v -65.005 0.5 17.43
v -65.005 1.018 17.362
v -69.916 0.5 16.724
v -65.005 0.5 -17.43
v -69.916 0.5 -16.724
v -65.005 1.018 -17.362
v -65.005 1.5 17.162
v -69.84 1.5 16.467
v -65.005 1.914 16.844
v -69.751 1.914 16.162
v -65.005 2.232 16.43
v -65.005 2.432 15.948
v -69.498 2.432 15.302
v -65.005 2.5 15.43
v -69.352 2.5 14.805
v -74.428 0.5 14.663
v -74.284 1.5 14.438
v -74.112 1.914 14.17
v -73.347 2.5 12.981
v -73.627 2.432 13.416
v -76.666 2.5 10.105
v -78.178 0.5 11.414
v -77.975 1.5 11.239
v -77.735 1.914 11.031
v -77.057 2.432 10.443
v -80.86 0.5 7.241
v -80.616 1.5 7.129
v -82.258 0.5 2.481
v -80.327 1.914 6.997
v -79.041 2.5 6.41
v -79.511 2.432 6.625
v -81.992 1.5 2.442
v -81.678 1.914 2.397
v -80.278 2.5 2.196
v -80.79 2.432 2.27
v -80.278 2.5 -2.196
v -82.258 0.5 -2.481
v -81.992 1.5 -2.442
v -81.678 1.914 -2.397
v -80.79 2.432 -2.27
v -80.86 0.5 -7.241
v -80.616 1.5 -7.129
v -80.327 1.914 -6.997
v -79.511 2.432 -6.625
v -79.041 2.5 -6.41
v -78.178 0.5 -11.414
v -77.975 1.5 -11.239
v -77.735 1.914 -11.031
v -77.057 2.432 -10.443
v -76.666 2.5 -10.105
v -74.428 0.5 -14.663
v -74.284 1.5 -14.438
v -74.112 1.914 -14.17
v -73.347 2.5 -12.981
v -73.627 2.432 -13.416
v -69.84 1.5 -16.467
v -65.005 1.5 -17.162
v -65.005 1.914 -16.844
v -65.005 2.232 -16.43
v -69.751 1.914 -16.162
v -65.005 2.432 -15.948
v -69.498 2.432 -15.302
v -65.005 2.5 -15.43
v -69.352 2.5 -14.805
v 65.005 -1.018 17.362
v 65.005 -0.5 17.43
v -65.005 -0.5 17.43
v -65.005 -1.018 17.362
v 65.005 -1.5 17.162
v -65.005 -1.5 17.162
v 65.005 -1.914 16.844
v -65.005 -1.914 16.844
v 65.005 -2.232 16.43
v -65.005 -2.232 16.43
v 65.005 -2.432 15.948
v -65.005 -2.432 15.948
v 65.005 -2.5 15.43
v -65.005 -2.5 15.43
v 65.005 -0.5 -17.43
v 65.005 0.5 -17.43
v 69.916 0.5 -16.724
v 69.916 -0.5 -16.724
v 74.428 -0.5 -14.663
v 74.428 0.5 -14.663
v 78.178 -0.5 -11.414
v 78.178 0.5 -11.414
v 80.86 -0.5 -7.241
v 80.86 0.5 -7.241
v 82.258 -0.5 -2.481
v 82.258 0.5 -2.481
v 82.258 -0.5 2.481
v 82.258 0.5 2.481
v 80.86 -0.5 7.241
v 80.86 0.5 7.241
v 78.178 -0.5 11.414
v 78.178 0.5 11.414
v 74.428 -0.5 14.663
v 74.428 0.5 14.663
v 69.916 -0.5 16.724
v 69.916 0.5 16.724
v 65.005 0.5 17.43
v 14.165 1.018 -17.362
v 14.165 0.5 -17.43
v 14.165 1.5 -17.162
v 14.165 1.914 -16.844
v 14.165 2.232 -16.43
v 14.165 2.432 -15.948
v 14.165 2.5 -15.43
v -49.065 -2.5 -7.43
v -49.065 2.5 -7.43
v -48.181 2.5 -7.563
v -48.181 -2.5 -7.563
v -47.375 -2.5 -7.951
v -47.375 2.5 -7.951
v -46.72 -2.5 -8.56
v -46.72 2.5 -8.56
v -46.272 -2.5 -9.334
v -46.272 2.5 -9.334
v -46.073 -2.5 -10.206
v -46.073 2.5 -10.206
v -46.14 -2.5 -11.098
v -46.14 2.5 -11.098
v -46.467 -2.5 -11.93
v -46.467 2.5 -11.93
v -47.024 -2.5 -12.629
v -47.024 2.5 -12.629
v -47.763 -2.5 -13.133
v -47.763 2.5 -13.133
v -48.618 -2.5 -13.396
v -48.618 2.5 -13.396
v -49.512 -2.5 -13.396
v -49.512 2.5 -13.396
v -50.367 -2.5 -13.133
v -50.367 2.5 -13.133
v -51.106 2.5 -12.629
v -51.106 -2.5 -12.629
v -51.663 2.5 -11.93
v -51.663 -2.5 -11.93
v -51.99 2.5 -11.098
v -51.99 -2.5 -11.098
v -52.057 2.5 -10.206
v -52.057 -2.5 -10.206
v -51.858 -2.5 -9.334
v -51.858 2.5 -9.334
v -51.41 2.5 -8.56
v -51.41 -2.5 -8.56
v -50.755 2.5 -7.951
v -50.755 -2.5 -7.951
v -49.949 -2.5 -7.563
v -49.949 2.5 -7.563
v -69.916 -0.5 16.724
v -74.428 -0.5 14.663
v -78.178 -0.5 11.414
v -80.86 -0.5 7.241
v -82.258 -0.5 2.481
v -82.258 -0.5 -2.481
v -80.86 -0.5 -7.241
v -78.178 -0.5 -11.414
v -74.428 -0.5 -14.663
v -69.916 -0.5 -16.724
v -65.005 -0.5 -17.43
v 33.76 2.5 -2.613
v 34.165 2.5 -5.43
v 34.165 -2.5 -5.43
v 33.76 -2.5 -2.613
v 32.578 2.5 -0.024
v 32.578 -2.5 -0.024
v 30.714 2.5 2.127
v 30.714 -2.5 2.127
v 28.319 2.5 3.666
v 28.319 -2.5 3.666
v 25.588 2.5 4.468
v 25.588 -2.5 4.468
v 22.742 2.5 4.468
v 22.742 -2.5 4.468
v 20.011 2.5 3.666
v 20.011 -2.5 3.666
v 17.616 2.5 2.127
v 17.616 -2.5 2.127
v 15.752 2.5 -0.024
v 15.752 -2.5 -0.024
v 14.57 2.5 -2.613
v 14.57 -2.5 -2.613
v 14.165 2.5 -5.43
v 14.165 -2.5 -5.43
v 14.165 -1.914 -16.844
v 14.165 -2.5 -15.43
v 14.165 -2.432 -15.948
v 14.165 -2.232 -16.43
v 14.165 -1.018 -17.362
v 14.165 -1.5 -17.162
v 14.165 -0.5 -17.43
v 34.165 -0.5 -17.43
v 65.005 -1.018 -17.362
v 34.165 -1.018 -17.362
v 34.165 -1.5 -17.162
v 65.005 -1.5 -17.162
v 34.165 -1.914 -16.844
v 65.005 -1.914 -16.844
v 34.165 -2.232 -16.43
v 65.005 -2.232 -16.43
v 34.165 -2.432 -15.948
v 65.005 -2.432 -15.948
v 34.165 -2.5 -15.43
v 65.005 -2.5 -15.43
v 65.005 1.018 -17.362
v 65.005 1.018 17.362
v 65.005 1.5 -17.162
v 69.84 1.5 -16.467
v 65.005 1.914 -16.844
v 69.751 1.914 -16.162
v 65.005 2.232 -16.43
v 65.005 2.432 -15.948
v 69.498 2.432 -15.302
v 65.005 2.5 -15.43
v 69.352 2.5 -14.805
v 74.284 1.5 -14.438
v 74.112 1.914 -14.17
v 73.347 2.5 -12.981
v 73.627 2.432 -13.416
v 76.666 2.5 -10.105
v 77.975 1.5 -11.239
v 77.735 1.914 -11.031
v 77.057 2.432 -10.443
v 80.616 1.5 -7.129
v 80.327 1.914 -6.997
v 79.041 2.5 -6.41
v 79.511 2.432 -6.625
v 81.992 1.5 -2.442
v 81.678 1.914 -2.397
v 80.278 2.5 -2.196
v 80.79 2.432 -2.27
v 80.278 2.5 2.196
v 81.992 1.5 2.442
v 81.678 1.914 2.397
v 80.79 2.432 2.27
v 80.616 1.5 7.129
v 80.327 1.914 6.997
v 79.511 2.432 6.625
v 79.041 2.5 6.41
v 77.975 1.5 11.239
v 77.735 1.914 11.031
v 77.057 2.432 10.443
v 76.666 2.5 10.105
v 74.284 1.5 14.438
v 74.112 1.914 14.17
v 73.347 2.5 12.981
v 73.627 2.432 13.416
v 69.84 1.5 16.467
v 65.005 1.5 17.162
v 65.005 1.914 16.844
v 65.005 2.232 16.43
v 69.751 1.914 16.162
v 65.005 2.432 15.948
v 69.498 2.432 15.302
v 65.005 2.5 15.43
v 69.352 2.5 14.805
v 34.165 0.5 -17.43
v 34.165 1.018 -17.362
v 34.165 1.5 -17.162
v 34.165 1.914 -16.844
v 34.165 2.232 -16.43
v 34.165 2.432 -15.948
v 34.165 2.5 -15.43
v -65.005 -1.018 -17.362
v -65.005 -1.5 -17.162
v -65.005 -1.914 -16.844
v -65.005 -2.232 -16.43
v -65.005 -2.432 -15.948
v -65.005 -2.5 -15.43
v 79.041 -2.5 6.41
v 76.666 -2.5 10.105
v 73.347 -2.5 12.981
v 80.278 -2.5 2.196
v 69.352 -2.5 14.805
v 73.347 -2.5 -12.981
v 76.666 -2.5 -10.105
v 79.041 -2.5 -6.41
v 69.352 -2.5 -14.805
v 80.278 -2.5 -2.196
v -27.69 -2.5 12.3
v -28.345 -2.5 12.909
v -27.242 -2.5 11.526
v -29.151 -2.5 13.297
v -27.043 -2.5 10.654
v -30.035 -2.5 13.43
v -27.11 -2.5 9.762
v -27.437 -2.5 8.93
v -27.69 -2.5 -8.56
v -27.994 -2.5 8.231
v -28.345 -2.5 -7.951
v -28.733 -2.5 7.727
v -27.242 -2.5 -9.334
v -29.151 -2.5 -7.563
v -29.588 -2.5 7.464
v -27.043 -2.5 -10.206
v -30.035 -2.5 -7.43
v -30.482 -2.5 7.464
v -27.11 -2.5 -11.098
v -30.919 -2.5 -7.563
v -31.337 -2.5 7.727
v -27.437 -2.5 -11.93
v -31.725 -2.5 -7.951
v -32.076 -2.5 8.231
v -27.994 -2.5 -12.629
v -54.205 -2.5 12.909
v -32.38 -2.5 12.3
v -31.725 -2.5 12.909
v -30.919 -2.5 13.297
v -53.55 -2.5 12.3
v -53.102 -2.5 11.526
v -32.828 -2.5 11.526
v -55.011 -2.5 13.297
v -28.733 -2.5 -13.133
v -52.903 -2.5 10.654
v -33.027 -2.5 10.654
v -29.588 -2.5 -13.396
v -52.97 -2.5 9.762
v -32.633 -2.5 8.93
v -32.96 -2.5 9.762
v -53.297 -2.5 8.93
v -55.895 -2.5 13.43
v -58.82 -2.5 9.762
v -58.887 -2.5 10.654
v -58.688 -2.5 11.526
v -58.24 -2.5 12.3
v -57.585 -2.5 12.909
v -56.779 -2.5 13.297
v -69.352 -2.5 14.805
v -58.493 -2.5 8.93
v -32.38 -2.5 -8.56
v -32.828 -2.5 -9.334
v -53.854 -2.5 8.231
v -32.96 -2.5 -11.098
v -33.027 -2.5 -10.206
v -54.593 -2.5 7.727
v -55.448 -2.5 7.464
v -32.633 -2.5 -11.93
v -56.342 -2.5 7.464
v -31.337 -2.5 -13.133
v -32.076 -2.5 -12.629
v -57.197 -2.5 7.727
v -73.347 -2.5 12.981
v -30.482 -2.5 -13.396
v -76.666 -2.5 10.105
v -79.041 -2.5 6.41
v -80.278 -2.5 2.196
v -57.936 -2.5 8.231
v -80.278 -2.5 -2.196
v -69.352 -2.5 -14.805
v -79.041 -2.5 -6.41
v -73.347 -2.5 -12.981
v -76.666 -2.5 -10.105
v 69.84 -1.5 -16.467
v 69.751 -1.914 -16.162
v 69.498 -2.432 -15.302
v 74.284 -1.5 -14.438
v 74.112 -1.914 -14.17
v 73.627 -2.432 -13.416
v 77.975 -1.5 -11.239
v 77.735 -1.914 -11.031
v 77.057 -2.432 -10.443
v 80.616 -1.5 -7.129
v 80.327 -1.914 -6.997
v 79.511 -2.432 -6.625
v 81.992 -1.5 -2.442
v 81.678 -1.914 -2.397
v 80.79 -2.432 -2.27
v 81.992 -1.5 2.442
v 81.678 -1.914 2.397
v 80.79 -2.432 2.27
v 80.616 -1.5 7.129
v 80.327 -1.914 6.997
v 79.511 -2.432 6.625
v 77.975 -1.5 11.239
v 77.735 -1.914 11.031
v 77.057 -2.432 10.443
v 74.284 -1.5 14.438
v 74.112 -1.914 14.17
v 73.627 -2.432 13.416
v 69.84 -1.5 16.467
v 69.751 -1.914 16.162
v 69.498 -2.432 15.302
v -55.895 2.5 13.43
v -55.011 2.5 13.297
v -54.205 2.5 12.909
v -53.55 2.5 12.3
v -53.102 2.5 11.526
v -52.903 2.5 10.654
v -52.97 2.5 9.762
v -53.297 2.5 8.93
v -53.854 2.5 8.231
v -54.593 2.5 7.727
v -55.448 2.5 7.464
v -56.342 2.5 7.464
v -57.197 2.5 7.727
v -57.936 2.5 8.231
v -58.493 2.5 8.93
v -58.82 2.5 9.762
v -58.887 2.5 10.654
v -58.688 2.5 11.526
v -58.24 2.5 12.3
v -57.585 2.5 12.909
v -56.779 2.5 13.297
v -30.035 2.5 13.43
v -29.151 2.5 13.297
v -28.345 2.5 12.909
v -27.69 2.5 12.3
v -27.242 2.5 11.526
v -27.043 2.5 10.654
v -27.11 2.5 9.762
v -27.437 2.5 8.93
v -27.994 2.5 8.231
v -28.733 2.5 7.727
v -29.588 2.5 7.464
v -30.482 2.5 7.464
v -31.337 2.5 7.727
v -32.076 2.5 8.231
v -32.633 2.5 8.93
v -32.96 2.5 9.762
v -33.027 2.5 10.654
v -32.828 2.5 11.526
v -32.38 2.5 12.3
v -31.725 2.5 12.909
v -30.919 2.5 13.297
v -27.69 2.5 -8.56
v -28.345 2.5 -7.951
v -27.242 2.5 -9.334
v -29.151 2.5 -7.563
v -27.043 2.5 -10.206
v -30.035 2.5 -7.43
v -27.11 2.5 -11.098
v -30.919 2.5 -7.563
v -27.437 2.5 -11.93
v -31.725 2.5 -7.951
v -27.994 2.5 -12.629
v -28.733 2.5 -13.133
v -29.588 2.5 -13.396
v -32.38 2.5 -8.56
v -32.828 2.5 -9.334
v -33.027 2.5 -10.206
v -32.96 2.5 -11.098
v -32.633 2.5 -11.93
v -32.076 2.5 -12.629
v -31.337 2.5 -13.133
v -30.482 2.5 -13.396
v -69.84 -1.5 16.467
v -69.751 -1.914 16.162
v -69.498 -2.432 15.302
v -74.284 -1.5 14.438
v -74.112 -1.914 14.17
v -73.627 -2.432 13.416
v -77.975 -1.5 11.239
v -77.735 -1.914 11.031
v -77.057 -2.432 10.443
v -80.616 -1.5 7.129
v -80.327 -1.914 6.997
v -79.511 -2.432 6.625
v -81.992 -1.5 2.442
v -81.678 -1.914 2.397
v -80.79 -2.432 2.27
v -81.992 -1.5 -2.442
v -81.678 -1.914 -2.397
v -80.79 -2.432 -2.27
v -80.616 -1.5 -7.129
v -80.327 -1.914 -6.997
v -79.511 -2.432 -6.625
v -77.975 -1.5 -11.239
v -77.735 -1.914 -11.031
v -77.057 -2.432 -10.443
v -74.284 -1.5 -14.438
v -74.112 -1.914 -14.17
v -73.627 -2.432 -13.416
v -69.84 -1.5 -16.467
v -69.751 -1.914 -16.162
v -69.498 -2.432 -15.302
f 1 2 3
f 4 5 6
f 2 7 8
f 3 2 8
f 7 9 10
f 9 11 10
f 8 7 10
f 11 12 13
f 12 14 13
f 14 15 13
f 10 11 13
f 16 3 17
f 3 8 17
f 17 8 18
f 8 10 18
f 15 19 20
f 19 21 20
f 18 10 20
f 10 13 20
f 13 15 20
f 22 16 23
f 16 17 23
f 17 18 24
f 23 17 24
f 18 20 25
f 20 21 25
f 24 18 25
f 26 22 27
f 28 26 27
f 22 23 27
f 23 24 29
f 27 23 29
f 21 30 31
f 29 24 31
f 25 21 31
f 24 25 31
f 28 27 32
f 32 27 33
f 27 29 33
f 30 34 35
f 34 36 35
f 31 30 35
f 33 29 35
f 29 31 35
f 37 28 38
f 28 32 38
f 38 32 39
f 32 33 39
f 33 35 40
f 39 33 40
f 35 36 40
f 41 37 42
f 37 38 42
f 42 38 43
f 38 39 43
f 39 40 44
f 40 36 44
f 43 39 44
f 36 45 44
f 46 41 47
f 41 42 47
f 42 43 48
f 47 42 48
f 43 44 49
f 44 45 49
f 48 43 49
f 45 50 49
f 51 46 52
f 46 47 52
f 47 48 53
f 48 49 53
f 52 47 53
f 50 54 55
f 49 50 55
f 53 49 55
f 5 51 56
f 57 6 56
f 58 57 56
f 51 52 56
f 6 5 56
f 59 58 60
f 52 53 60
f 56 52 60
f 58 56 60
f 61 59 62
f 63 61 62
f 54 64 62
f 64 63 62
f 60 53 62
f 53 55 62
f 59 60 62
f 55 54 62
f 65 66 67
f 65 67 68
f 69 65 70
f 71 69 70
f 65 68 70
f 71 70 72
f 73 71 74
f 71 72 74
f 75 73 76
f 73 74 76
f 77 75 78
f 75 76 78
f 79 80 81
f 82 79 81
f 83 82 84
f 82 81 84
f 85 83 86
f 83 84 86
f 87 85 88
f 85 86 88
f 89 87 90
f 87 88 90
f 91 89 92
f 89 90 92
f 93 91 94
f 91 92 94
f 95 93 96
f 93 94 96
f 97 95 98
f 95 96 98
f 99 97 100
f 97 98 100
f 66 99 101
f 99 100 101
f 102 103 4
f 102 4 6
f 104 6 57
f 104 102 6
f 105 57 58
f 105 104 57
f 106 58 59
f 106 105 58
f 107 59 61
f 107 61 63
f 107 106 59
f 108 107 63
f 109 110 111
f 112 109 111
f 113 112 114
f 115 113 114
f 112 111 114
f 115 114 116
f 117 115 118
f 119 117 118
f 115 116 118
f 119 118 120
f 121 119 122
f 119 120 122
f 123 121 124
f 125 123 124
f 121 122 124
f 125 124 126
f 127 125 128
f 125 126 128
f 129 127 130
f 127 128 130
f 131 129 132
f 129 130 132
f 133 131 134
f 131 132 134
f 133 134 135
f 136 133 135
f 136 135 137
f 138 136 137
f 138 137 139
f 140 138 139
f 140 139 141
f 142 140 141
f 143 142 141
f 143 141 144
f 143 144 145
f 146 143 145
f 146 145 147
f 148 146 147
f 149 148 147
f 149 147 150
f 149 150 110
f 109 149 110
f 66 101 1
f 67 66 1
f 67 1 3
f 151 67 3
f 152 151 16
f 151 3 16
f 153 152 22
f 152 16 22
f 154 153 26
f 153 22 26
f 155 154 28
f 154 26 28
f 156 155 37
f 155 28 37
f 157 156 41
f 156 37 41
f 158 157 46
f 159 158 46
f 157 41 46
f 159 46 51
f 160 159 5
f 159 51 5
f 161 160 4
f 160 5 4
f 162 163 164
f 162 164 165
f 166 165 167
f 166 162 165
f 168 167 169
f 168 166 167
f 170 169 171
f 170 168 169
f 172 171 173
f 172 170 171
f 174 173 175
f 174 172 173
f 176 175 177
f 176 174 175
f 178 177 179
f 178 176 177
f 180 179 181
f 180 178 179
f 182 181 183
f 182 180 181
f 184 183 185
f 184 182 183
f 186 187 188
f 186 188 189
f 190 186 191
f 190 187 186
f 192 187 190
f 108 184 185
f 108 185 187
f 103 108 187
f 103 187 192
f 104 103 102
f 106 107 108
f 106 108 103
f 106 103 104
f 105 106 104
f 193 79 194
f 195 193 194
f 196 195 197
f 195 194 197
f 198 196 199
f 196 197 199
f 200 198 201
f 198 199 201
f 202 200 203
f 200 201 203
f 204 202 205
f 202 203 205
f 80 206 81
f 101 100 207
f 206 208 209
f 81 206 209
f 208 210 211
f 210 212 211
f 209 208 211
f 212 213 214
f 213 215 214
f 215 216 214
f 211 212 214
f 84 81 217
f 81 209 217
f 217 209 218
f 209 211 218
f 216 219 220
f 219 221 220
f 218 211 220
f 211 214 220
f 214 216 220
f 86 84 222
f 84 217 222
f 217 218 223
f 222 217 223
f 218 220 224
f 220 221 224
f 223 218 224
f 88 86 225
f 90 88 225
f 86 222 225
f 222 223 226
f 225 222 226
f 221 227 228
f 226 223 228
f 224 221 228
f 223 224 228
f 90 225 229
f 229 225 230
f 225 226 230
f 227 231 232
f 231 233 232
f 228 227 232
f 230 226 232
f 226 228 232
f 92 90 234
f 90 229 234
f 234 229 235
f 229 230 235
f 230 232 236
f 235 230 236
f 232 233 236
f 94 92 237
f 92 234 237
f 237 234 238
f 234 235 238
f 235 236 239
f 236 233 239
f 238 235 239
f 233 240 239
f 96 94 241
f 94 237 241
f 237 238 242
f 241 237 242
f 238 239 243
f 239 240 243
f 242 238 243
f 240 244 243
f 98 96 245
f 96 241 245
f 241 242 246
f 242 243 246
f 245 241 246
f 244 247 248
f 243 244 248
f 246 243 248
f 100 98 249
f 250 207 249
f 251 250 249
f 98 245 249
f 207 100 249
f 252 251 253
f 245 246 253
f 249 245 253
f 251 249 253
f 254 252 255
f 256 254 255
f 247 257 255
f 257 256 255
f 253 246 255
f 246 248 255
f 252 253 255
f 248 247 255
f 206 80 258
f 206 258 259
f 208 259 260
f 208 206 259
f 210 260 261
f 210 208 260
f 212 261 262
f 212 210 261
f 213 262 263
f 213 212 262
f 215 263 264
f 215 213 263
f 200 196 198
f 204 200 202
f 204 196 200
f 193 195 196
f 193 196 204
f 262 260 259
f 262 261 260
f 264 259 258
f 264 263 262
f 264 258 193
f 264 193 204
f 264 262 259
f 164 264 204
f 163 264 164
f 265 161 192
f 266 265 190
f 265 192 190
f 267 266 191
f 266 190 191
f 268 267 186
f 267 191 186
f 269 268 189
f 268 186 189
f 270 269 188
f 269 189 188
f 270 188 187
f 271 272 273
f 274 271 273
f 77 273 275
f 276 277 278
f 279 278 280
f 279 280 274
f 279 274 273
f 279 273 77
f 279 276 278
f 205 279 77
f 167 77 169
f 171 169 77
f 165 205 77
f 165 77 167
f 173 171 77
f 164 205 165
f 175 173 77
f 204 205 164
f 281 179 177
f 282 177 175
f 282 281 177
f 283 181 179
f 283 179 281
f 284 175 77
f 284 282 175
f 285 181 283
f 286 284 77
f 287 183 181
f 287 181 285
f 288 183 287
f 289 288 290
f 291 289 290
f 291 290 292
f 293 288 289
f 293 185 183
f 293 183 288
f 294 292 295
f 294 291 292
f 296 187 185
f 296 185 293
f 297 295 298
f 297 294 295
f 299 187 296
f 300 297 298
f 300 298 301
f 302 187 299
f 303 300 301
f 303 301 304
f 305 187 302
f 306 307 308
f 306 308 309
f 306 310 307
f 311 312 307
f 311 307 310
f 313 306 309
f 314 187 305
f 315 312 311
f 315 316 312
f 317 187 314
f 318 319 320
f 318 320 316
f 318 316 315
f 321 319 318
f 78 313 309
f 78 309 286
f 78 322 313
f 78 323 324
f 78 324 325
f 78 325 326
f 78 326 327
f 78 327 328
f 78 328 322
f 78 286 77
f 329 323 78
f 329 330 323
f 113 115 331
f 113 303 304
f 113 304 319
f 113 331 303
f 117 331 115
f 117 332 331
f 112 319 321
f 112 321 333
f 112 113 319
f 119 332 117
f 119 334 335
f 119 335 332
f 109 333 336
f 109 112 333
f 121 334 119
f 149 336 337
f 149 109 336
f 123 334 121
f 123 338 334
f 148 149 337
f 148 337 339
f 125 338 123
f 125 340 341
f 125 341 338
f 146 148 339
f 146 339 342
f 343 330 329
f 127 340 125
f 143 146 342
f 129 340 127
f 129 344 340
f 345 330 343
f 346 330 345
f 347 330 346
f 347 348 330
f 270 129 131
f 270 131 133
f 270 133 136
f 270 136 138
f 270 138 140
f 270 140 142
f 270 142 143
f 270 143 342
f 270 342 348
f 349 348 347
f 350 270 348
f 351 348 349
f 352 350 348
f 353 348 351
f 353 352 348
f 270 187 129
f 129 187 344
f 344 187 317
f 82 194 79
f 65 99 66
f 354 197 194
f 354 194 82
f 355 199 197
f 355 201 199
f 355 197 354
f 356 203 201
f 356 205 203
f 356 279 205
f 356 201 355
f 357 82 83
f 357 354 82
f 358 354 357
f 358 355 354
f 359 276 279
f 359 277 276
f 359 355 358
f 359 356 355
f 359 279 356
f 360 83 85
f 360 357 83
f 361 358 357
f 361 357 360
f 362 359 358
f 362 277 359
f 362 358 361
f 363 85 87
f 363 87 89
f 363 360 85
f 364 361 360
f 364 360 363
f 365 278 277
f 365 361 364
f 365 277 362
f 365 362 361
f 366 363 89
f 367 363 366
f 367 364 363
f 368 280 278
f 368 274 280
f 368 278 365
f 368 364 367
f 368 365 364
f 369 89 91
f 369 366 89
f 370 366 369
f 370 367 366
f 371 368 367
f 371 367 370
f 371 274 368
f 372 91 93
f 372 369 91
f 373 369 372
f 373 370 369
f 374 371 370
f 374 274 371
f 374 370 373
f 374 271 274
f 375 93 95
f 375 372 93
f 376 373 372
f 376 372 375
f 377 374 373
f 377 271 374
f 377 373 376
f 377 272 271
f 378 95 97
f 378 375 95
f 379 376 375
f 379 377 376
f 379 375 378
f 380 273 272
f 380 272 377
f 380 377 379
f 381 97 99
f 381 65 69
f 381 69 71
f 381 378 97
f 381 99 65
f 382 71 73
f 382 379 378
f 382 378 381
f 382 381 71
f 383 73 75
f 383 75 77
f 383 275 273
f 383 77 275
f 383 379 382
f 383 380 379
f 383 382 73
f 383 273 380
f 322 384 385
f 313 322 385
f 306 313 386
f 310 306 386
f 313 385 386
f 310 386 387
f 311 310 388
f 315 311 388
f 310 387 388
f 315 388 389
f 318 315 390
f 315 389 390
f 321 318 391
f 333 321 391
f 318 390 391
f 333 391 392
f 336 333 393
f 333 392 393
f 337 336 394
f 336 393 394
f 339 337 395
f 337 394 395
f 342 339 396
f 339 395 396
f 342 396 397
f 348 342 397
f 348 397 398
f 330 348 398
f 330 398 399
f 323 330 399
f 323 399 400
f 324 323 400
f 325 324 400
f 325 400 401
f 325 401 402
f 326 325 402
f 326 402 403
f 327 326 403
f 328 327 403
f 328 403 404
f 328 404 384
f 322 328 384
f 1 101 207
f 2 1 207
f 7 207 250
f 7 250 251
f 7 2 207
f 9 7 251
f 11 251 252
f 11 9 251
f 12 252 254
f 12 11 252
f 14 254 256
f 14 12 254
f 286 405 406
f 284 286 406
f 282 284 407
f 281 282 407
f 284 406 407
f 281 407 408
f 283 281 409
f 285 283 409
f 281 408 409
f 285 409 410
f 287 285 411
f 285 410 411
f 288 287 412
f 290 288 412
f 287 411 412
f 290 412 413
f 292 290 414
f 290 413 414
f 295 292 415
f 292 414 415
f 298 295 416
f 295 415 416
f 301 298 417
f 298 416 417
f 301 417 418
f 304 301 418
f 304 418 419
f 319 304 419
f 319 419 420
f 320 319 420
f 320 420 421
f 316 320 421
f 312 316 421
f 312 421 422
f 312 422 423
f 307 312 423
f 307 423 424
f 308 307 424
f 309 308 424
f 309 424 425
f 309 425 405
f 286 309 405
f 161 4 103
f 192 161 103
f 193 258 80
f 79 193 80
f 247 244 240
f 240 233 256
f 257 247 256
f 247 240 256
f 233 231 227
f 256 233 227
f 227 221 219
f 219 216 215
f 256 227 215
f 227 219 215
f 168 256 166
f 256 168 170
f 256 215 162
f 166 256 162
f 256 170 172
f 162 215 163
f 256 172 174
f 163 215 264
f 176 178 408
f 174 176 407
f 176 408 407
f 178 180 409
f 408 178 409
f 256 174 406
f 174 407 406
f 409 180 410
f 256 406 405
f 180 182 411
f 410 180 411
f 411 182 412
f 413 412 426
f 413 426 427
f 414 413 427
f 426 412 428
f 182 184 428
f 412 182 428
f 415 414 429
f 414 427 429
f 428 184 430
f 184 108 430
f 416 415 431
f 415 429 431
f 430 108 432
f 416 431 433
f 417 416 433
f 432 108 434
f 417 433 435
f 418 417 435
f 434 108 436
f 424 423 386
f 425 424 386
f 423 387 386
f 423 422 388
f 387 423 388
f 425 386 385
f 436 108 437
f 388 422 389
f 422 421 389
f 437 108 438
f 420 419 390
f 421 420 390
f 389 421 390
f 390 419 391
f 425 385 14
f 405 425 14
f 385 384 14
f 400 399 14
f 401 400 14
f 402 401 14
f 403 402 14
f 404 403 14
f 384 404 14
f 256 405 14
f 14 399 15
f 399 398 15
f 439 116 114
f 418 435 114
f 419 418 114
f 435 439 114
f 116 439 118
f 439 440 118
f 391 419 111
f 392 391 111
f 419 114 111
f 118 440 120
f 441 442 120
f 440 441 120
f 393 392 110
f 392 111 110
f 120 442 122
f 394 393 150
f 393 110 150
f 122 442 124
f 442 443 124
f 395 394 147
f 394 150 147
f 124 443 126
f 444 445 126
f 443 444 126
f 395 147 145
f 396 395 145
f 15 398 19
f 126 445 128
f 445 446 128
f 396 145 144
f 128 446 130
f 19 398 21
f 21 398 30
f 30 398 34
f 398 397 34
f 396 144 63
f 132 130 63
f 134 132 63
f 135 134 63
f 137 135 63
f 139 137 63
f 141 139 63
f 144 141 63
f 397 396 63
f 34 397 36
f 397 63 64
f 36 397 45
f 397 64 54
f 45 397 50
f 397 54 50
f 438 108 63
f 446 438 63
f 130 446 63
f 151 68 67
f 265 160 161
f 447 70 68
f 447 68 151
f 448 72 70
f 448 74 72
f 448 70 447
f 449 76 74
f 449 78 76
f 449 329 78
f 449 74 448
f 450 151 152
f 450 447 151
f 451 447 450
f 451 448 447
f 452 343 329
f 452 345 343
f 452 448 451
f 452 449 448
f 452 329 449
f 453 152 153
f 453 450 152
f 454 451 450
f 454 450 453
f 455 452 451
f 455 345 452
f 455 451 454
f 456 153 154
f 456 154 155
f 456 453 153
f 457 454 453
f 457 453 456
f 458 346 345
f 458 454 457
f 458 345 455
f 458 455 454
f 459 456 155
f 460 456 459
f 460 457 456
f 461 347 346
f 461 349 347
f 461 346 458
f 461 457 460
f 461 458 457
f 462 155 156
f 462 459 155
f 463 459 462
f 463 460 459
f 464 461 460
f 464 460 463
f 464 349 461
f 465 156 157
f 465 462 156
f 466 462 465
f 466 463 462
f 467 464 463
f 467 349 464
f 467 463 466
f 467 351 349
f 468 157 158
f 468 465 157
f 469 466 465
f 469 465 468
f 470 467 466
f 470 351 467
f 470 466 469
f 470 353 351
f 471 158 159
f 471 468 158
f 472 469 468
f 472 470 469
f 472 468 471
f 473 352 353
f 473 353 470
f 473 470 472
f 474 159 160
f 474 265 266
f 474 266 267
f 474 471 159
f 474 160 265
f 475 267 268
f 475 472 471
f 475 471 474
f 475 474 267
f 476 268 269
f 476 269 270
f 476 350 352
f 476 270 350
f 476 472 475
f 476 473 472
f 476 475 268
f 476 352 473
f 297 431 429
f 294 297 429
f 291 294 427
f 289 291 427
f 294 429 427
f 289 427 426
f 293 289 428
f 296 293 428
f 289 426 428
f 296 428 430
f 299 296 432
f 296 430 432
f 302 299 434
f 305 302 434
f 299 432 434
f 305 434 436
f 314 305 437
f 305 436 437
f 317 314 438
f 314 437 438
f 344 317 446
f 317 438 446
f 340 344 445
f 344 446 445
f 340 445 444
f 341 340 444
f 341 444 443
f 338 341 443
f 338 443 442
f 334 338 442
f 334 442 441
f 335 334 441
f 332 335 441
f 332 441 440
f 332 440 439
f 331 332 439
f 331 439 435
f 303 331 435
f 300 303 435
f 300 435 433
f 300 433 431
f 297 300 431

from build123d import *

# Parameters (mm, degrees)
BOSS_EXTRUDE1_DEPTH = 2.5
CUT_EXTRUDE1_REACH  = 86.406
SKETCH2_R           = 3
FILLET1_R           = 2
CUT_EXTRUDE2_DEPTH  = 10


with BuildPart() as part:
    # Sketch1 → Boss-Extrude1 (new, symmetric)
    with BuildSketch(Plane(origin=(0, 0, 0), x_dir=(1, 0, 0), z_dir=(0, 1, 0))):
        with BuildLine():
            Line((-65.005, 17.43), (65.005, 17.43))
            ThreePointArc((65.005, 17.43), (82.435, 0), (65.005, -17.43))
            Line((65.005, -17.43), (-65.005, -17.43))
            ThreePointArc((-65.005, -17.43), (-82.435, 0), (-65.005, 17.43))
        make_face()
    extrude(amount=BOSS_EXTRUDE1_DEPTH, both=True)

    # Sketch2 → Cut-Extrude1 (cut, up to next)
    with BuildSketch(Plane(origin=(0, 2.5, 0), x_dir=(1, 0, 0), z_dir=(0, 1, 0)), mode=Mode.PRIVATE) as cut_extrude1_sk1:
        with Locations(Location((-49.065, 10.43, 0), (0, 0, 270))):
            Circle(SKETCH2_R)
    cut_extrude1_tool1 = extrude(cut_extrude1_sk1.sketch, amount=-CUT_EXTRUDE1_REACH, mode=Mode.PRIVATE) & part.part
    # Sketch2 → Cut-Extrude1 (cut, up to next)
    with BuildSketch(Plane(origin=(0, 2.5, 0), x_dir=(1, 0, 0), z_dir=(0, 1, 0)), mode=Mode.PRIVATE) as cut_extrude1_sk2:
        with Locations(Location((-30.035, 10.43, 0), (0, 0, 270))):
            Circle(SKETCH2_R)
    cut_extrude1_tool2 = extrude(cut_extrude1_sk2.sketch, amount=-CUT_EXTRUDE1_REACH, mode=Mode.PRIVATE) & part.part
    # Sketch2 → Cut-Extrude1 (cut, up to next)
    with BuildSketch(Plane(origin=(0, 2.5, 0), x_dir=(1, 0, 0), z_dir=(0, 1, 0)), mode=Mode.PRIVATE) as cut_extrude1_sk3:
        with Locations(Location((-55.895, -10.43, 0), (0, 0, 270))):
            Circle(SKETCH2_R)
    cut_extrude1_tool3 = extrude(cut_extrude1_sk3.sketch, amount=-CUT_EXTRUDE1_REACH, mode=Mode.PRIVATE) & part.part
    # Sketch2 → Cut-Extrude1 (cut, up to next)
    with BuildSketch(Plane(origin=(0, 2.5, 0), x_dir=(1, 0, 0), z_dir=(0, 1, 0)), mode=Mode.PRIVATE) as cut_extrude1_sk4:
        with Locations(Location((-30.035, -10.43, 0), (0, 0, 270))):
            Circle(SKETCH2_R)
    cut_extrude1_tool4 = extrude(cut_extrude1_sk4.sketch, amount=-CUT_EXTRUDE1_REACH, mode=Mode.PRIVATE) & part.part
    add(cut_extrude1_tool1.solids().sort_by_distance((-49.065, 2.5, -10.43))[0], mode=Mode.SUBTRACT)
    add(cut_extrude1_tool2.solids().sort_by_distance((-30.035, 2.5, -10.43))[0], mode=Mode.SUBTRACT)
    add(cut_extrude1_tool3.solids().sort_by_distance((-55.895, 2.5, 10.43))[0], mode=Mode.SUBTRACT)
    add(cut_extrude1_tool4.solids().sort_by_distance((-30.035, 2.5, 10.43))[0], mode=Mode.SUBTRACT)

    # Fillet1
    fillet1_edges = [part.edges().sort_by_distance(p)[0] for p in [
        (82.435, 2.5, 0),
        (0, 2.5, -17.43),
        (-82.435, 2.5, 0),
        (0, -2.5, -17.43),
        (82.435, -2.5, 0),
        (0, -2.5, 17.43),
        (-82.435, -2.5, 0),
        (0, 2.5, 17.43),
    ]]
    fillet(fillet1_edges, radius=FILLET1_R)

    # Sketch3 → Cut-Extrude2 (cut)
    with BuildSketch(Plane(origin=(0, 2.5, 0), x_dir=(1, 0, 0), z_dir=(0, 1, 0))):
        with BuildLine():
            Line((34.165, 17.43), (34.165, 5.43))
            ThreePointArc((34.165, 5.43), (24.165, -4.57), (14.165, 5.43))
            Line((14.165, 5.43), (14.165, 17.43))
            Line((14.165, 17.43), (34.165, 17.43))
        make_face()
    extrude(amount=-CUT_EXTRUDE2_DEPTH, mode=Mode.SUBTRACT)


solid = part.part
